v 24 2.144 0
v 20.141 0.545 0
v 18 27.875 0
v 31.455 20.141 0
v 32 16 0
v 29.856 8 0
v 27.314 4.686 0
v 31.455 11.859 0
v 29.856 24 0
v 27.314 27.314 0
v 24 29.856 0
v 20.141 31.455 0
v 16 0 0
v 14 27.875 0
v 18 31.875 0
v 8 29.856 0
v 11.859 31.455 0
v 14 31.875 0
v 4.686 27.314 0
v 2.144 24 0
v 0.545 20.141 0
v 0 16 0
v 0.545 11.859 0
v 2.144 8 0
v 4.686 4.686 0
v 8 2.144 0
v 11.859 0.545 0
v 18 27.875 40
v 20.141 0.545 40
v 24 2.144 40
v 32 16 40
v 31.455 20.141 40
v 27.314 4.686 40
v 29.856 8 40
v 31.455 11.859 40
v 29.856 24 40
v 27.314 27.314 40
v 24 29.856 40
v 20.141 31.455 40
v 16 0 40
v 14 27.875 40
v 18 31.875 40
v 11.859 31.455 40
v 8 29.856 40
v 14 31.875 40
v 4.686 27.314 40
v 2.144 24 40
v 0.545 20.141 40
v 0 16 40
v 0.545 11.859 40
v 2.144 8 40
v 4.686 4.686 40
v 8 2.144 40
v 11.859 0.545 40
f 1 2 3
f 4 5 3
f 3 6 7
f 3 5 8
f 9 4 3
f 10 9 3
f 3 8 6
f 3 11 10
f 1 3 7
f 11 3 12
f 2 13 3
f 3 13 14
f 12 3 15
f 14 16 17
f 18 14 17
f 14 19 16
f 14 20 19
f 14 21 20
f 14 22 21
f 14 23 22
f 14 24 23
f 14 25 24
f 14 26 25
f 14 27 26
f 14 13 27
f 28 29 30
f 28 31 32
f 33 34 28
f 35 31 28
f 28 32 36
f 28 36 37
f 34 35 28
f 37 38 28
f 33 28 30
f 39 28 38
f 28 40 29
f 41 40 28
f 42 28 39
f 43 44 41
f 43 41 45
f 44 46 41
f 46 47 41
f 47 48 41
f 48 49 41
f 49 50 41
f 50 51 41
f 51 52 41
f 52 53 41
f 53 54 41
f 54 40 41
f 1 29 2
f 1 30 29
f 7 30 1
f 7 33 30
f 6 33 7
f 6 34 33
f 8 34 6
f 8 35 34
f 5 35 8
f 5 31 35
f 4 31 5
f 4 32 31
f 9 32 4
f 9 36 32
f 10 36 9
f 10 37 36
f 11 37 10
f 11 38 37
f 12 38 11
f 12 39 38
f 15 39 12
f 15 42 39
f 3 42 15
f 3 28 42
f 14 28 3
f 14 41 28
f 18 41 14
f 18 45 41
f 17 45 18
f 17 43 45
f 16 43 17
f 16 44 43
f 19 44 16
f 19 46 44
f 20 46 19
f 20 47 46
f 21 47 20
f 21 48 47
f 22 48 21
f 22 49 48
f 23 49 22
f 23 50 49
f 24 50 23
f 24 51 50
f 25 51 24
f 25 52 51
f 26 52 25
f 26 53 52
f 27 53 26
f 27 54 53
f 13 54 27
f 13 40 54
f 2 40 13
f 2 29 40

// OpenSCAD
$fn = 32;

// ----------------------------------------------------------------------
// Keyway shaft: d32 shaft, key 4 x 4 mm
// ----------------------------------------------------------------------

// --- parameters (mm) ---
shaft_r = 16;             // shaft radius
key_w = 4;                // keyway width
key_d = 4;                // keyway depth below the surface line
plate_t = 40;             // shaft length, Z (extrusion height)

shaft_d = 2 * shaft_r;  // shaft diameter
circle_step = 15;  // polygon sampling step, degrees

profile = [[11.859, 31.455], [8, 29.856], [4.686, 27.314], [2.144, 24], [0.545, 20.141], [0, 16], [0.545, 11.859], [2.144, 8], [4.686, 4.686], [8, 2.144], [11.859, 0.545], [16, 0], [20.141, 0.545], [24, 2.144], [27.314, 4.686], [29.856, 8], [31.455, 11.859], [32, 16], [31.455, 20.141], [29.856, 24], [27.314, 27.314], [24, 29.856], [20.141, 31.455], [18, 31.875], [18, 27.875], [14, 27.875], [14, 31.875]];  // primary outline, 27 points, counter clockwise

// --- the one profile operation ---
linear_extrude(height = plate_t) polygon(points = profile);
